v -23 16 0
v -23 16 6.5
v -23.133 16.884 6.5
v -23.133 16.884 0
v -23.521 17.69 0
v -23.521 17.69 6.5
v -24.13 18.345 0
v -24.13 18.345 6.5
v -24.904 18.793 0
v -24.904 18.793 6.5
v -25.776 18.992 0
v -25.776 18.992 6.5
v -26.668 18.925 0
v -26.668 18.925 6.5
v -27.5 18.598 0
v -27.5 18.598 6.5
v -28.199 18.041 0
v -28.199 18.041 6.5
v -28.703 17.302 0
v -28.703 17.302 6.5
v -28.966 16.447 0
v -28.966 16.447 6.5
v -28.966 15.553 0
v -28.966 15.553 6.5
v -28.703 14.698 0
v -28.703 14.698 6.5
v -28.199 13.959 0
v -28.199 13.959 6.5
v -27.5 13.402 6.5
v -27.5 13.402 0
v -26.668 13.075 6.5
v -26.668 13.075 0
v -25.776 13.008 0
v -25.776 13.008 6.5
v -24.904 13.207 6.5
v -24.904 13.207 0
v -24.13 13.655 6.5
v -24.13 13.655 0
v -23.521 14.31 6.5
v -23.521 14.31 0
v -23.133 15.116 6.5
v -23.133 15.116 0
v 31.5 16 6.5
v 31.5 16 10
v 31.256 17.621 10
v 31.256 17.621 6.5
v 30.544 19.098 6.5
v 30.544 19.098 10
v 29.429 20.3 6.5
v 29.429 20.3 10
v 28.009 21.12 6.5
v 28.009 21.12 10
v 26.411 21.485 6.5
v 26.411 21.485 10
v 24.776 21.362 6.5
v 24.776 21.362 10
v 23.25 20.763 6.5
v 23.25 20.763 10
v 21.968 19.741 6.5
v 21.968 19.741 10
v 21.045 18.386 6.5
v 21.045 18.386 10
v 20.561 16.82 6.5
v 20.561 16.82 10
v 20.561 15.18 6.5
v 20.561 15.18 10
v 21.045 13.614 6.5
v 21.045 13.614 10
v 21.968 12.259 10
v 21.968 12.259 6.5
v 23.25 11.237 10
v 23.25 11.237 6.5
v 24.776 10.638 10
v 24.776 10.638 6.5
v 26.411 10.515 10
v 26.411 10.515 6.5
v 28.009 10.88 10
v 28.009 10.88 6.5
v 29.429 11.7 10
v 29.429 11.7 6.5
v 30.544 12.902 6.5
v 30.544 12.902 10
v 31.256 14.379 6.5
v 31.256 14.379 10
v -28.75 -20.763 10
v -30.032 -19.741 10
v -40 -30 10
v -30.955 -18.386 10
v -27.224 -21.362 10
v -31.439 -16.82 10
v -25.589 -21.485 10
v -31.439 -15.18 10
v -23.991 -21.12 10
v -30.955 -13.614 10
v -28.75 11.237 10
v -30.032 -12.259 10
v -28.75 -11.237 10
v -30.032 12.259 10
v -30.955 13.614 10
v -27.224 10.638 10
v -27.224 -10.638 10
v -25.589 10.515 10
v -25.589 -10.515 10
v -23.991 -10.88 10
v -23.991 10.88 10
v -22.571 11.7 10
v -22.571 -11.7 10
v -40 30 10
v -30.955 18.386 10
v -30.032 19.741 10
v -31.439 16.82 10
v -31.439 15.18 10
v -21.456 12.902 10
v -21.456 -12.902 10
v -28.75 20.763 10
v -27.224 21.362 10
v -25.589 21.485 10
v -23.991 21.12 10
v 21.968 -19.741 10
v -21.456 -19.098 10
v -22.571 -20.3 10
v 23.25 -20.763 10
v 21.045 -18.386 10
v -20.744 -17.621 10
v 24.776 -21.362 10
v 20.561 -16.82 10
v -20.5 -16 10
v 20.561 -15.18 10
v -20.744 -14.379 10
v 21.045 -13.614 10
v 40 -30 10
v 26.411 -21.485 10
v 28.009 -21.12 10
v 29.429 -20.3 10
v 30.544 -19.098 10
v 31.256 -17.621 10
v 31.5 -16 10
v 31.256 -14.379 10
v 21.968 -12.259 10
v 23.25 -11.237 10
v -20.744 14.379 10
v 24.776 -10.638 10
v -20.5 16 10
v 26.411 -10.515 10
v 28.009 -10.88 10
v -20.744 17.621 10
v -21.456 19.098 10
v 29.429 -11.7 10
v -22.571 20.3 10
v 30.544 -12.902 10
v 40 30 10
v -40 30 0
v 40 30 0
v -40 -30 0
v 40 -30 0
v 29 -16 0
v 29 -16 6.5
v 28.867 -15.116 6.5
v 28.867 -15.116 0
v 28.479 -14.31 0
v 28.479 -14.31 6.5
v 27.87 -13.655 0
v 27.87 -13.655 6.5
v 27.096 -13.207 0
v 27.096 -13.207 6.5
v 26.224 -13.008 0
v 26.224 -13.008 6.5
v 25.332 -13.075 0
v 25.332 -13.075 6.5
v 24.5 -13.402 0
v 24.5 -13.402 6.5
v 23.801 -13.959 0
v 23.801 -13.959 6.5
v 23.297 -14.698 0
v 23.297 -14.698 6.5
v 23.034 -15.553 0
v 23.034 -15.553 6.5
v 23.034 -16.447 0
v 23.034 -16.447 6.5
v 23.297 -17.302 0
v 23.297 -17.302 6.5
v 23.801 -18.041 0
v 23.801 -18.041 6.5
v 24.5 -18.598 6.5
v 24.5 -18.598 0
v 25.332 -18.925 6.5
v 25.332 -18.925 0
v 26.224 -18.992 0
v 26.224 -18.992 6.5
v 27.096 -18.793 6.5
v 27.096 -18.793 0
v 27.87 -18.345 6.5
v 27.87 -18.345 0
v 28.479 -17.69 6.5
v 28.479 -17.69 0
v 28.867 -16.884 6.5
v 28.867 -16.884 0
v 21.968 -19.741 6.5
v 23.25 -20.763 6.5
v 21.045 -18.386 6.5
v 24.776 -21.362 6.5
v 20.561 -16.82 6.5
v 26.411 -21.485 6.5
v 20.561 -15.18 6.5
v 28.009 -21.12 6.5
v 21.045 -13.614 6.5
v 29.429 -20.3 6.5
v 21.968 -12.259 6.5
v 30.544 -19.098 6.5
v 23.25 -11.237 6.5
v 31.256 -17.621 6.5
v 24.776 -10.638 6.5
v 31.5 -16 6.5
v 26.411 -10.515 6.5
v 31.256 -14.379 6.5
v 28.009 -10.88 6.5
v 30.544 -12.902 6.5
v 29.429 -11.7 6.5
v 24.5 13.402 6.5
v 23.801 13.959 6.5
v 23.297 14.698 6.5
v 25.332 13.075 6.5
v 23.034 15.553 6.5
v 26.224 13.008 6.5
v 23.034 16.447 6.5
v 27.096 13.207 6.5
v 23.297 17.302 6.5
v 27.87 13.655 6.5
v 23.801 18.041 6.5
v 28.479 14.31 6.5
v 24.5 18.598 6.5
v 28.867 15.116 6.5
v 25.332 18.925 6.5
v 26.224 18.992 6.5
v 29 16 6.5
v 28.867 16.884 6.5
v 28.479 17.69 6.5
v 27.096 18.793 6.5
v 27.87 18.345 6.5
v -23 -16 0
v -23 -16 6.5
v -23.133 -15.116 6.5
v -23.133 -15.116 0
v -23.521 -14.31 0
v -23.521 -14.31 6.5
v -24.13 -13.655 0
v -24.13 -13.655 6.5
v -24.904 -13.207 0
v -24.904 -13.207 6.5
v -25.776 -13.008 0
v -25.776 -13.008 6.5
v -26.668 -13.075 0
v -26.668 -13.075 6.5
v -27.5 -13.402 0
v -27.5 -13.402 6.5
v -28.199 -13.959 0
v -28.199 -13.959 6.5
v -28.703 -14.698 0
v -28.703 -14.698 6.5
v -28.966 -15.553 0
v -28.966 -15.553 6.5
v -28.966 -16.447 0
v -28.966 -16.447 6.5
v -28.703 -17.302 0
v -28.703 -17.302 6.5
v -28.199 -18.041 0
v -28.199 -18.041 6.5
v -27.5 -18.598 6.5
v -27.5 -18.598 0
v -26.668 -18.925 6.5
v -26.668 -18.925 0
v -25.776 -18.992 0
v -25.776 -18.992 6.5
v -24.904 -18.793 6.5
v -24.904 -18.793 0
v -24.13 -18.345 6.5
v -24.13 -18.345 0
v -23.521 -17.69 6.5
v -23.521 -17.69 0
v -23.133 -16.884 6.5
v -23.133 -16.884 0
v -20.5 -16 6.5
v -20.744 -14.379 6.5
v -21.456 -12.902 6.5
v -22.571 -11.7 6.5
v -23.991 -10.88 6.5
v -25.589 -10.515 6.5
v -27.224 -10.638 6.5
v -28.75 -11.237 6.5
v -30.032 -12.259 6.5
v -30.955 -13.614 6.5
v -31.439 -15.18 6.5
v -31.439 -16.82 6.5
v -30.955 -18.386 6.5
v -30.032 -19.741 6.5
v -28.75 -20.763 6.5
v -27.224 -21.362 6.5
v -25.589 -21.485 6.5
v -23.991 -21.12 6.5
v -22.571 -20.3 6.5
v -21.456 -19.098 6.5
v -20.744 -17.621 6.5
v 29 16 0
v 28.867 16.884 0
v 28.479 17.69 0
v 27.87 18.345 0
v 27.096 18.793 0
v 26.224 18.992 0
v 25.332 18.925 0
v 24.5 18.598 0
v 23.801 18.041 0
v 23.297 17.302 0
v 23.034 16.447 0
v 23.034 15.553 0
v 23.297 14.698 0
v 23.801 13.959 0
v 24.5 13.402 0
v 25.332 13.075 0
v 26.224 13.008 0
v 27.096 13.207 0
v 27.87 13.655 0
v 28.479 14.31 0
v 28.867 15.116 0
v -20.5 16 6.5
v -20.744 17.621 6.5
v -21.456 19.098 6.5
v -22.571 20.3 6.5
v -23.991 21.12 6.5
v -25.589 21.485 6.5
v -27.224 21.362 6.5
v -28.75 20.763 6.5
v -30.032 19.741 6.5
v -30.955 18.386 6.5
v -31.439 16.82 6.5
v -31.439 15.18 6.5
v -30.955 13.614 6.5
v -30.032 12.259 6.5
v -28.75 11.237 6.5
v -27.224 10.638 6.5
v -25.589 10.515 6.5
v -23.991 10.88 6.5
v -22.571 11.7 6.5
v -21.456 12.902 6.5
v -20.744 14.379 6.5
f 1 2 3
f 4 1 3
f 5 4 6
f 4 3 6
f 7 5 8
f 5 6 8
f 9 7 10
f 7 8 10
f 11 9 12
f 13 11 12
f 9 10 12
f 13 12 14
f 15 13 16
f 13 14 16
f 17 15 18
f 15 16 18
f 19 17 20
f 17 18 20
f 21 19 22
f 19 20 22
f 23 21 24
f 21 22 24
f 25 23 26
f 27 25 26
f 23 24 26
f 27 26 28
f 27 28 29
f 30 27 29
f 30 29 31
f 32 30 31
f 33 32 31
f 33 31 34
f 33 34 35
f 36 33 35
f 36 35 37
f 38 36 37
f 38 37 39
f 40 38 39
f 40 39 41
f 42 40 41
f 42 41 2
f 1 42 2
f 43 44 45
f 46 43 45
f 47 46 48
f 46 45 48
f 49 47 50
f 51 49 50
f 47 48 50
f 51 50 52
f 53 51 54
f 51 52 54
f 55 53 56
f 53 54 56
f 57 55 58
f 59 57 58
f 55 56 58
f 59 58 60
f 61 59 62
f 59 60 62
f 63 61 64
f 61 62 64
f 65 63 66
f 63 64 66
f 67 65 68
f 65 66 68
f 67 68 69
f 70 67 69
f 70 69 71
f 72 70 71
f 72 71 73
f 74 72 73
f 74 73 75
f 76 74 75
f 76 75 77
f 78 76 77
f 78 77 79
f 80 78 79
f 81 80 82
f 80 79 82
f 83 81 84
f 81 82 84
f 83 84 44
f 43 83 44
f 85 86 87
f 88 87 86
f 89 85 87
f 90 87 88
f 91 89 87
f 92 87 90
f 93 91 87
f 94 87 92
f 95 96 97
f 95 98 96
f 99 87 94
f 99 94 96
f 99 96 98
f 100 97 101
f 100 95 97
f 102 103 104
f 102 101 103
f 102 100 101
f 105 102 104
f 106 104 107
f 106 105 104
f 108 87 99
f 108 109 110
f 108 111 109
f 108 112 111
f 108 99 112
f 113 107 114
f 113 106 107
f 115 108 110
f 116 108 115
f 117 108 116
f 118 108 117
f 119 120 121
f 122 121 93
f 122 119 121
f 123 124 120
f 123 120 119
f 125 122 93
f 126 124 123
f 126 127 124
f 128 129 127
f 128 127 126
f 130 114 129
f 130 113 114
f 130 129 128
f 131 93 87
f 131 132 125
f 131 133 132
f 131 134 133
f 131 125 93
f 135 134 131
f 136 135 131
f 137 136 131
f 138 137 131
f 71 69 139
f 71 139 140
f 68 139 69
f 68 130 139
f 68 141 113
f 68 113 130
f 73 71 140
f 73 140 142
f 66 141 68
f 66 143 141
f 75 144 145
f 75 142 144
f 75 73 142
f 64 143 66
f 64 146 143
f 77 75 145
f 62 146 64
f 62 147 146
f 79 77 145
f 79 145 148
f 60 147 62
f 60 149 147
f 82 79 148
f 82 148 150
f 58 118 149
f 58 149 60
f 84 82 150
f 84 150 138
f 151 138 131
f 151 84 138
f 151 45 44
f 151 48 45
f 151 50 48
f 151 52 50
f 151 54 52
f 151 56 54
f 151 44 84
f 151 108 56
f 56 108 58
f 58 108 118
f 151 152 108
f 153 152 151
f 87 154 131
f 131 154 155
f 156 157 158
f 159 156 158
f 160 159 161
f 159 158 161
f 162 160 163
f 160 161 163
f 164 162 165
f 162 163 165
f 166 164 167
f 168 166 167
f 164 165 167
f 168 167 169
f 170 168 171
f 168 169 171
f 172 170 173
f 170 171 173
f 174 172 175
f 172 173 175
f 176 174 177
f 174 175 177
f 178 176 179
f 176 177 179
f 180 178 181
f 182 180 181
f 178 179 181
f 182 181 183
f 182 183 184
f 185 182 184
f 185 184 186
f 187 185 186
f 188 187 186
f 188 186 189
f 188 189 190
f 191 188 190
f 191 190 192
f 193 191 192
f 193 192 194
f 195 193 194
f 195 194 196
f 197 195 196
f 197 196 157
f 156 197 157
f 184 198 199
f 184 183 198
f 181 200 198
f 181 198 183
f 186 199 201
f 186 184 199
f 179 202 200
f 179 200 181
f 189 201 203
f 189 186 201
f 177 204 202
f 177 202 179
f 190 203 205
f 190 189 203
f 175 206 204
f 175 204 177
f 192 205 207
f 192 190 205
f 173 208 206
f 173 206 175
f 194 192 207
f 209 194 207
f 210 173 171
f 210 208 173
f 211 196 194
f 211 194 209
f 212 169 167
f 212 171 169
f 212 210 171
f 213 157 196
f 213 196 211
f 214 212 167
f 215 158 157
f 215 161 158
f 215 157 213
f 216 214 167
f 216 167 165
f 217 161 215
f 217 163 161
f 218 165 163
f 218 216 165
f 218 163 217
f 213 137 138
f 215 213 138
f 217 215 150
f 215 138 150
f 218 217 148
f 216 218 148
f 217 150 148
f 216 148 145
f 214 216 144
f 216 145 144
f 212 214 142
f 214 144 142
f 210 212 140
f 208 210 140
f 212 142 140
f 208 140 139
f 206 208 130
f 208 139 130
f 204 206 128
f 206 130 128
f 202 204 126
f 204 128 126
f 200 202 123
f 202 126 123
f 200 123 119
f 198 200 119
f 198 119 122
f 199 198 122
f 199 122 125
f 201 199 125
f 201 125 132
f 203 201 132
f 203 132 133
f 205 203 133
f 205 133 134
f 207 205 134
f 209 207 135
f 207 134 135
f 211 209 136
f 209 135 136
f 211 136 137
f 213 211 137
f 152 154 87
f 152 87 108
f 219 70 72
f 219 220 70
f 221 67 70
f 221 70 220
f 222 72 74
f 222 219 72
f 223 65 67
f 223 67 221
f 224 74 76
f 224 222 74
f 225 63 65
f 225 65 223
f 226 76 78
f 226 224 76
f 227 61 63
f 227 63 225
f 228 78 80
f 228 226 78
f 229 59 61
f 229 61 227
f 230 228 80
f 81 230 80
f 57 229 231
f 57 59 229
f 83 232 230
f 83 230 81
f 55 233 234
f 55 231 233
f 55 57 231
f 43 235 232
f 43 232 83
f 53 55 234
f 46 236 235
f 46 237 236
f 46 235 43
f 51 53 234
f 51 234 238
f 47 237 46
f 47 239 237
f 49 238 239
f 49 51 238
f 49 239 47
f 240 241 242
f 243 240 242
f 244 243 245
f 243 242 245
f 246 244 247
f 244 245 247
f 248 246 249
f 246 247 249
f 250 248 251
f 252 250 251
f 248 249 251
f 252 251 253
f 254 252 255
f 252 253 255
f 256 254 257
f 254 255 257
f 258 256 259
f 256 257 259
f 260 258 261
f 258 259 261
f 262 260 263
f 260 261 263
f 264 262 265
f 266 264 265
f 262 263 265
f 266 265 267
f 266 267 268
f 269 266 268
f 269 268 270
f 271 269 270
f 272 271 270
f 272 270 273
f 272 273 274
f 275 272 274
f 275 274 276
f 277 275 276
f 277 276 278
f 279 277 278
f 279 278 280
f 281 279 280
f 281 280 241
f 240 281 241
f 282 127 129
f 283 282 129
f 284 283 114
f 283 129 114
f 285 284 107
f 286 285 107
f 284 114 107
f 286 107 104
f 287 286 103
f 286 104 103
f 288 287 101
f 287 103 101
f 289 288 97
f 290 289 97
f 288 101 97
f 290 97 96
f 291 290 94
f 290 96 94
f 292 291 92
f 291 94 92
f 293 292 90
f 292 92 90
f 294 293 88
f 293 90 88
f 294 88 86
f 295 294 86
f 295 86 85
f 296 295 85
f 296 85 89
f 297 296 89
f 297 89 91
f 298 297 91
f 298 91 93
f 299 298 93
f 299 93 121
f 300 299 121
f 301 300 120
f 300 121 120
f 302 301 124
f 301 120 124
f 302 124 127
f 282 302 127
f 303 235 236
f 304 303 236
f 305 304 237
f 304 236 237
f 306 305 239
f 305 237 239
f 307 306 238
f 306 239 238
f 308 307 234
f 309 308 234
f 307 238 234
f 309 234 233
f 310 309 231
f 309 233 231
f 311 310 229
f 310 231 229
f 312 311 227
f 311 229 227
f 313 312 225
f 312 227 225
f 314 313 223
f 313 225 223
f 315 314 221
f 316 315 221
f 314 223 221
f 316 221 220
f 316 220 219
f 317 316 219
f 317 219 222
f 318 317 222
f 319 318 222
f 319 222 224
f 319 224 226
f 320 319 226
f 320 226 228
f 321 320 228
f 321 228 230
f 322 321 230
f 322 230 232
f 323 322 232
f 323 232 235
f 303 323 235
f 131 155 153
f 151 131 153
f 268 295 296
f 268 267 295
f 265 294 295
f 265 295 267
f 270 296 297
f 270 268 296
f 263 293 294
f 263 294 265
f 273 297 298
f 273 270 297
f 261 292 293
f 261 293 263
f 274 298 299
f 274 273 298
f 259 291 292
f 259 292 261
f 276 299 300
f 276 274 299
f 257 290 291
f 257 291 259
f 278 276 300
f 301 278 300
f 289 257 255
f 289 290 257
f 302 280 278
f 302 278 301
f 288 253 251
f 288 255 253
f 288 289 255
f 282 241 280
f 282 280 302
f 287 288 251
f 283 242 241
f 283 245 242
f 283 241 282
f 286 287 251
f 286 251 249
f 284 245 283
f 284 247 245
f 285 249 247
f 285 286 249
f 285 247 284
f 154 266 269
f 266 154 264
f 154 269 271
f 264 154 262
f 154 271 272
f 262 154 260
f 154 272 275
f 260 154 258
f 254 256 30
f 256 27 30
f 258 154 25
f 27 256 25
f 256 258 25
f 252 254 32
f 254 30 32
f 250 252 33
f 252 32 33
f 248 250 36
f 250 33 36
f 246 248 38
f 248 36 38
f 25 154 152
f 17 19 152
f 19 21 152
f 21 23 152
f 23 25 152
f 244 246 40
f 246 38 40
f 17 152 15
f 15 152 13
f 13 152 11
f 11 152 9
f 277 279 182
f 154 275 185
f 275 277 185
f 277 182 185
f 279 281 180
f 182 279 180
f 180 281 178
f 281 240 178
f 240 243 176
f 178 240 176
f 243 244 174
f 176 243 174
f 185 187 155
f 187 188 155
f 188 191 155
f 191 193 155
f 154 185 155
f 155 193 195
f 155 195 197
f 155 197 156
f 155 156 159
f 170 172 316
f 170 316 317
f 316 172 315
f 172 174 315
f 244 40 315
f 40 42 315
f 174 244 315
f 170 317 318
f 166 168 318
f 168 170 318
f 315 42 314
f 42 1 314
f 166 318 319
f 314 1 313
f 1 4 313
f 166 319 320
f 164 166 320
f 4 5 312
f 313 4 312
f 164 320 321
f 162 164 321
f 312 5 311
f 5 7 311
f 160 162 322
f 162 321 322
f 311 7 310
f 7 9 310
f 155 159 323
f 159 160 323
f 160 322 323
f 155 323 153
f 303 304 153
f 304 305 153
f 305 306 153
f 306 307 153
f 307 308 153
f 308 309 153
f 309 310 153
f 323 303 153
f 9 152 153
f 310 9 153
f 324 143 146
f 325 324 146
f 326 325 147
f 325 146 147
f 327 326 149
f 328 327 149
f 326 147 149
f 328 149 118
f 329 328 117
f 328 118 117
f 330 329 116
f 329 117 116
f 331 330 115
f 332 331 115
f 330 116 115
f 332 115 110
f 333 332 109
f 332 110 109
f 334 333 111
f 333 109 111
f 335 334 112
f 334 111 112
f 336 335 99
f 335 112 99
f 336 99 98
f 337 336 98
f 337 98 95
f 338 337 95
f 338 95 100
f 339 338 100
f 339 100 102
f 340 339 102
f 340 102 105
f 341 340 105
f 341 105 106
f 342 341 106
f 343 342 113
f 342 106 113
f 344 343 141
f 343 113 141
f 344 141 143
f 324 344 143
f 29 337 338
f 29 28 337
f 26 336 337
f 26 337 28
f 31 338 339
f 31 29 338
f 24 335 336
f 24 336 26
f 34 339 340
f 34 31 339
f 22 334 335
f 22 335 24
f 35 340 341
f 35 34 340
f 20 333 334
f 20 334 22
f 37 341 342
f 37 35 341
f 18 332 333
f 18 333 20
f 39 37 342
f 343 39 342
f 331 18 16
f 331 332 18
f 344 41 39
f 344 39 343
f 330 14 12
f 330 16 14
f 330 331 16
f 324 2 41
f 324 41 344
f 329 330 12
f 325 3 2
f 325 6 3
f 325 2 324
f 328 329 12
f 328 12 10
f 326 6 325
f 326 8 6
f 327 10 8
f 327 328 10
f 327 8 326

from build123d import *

# Parameters (mm, degrees)
SKETCH_1_W          = 80
SKETCH_1_H          = 60
EXTRUDE_1_DEPTH     = 10
SKETCH_2_R          = 5.5
CUT_EXTRUDE_1_DEPTH = 3.5
SKETCH_3_R          = 3
CUT_EXTRUDE_2_DEPTH = 51.990195136


with BuildPart() as part:
    # 草图1 → 凸台-拉伸1 (new body)
    with BuildSketch(Plane.XY):
        Rectangle(SKETCH_1_W, SKETCH_1_H)
    extrude(amount=EXTRUDE_1_DEPTH)

    # 草图2 → 切除-拉伸1 (cut)
    with BuildSketch(Plane.XY.offset(10)):
        with Locations((26, 16)):
            Circle(SKETCH_2_R)
        with Locations((26, -16)):
            Circle(SKETCH_2_R)
        with Locations((-26, 16)):
            Circle(SKETCH_2_R)
        with Locations((-26, -16)):
            Circle(SKETCH_2_R)
    extrude(amount=-CUT_EXTRUDE_1_DEPTH, mode=Mode.SUBTRACT)

    # 草图3 → 切除-拉伸2 (cut, through all)
    with BuildSketch(Plane.XY.offset(10)):
        with Locations((26, 16)):
            Circle(SKETCH_3_R)
        with Locations((26, -16)):
            Circle(SKETCH_3_R)
        with Locations((-26, 16)):
            Circle(SKETCH_3_R)
        with Locations((-26, -16)):
            Circle(SKETCH_3_R)
    extrude(amount=-CUT_EXTRUDE_2_DEPTH, mode=Mode.SUBTRACT)


solid = part.part
